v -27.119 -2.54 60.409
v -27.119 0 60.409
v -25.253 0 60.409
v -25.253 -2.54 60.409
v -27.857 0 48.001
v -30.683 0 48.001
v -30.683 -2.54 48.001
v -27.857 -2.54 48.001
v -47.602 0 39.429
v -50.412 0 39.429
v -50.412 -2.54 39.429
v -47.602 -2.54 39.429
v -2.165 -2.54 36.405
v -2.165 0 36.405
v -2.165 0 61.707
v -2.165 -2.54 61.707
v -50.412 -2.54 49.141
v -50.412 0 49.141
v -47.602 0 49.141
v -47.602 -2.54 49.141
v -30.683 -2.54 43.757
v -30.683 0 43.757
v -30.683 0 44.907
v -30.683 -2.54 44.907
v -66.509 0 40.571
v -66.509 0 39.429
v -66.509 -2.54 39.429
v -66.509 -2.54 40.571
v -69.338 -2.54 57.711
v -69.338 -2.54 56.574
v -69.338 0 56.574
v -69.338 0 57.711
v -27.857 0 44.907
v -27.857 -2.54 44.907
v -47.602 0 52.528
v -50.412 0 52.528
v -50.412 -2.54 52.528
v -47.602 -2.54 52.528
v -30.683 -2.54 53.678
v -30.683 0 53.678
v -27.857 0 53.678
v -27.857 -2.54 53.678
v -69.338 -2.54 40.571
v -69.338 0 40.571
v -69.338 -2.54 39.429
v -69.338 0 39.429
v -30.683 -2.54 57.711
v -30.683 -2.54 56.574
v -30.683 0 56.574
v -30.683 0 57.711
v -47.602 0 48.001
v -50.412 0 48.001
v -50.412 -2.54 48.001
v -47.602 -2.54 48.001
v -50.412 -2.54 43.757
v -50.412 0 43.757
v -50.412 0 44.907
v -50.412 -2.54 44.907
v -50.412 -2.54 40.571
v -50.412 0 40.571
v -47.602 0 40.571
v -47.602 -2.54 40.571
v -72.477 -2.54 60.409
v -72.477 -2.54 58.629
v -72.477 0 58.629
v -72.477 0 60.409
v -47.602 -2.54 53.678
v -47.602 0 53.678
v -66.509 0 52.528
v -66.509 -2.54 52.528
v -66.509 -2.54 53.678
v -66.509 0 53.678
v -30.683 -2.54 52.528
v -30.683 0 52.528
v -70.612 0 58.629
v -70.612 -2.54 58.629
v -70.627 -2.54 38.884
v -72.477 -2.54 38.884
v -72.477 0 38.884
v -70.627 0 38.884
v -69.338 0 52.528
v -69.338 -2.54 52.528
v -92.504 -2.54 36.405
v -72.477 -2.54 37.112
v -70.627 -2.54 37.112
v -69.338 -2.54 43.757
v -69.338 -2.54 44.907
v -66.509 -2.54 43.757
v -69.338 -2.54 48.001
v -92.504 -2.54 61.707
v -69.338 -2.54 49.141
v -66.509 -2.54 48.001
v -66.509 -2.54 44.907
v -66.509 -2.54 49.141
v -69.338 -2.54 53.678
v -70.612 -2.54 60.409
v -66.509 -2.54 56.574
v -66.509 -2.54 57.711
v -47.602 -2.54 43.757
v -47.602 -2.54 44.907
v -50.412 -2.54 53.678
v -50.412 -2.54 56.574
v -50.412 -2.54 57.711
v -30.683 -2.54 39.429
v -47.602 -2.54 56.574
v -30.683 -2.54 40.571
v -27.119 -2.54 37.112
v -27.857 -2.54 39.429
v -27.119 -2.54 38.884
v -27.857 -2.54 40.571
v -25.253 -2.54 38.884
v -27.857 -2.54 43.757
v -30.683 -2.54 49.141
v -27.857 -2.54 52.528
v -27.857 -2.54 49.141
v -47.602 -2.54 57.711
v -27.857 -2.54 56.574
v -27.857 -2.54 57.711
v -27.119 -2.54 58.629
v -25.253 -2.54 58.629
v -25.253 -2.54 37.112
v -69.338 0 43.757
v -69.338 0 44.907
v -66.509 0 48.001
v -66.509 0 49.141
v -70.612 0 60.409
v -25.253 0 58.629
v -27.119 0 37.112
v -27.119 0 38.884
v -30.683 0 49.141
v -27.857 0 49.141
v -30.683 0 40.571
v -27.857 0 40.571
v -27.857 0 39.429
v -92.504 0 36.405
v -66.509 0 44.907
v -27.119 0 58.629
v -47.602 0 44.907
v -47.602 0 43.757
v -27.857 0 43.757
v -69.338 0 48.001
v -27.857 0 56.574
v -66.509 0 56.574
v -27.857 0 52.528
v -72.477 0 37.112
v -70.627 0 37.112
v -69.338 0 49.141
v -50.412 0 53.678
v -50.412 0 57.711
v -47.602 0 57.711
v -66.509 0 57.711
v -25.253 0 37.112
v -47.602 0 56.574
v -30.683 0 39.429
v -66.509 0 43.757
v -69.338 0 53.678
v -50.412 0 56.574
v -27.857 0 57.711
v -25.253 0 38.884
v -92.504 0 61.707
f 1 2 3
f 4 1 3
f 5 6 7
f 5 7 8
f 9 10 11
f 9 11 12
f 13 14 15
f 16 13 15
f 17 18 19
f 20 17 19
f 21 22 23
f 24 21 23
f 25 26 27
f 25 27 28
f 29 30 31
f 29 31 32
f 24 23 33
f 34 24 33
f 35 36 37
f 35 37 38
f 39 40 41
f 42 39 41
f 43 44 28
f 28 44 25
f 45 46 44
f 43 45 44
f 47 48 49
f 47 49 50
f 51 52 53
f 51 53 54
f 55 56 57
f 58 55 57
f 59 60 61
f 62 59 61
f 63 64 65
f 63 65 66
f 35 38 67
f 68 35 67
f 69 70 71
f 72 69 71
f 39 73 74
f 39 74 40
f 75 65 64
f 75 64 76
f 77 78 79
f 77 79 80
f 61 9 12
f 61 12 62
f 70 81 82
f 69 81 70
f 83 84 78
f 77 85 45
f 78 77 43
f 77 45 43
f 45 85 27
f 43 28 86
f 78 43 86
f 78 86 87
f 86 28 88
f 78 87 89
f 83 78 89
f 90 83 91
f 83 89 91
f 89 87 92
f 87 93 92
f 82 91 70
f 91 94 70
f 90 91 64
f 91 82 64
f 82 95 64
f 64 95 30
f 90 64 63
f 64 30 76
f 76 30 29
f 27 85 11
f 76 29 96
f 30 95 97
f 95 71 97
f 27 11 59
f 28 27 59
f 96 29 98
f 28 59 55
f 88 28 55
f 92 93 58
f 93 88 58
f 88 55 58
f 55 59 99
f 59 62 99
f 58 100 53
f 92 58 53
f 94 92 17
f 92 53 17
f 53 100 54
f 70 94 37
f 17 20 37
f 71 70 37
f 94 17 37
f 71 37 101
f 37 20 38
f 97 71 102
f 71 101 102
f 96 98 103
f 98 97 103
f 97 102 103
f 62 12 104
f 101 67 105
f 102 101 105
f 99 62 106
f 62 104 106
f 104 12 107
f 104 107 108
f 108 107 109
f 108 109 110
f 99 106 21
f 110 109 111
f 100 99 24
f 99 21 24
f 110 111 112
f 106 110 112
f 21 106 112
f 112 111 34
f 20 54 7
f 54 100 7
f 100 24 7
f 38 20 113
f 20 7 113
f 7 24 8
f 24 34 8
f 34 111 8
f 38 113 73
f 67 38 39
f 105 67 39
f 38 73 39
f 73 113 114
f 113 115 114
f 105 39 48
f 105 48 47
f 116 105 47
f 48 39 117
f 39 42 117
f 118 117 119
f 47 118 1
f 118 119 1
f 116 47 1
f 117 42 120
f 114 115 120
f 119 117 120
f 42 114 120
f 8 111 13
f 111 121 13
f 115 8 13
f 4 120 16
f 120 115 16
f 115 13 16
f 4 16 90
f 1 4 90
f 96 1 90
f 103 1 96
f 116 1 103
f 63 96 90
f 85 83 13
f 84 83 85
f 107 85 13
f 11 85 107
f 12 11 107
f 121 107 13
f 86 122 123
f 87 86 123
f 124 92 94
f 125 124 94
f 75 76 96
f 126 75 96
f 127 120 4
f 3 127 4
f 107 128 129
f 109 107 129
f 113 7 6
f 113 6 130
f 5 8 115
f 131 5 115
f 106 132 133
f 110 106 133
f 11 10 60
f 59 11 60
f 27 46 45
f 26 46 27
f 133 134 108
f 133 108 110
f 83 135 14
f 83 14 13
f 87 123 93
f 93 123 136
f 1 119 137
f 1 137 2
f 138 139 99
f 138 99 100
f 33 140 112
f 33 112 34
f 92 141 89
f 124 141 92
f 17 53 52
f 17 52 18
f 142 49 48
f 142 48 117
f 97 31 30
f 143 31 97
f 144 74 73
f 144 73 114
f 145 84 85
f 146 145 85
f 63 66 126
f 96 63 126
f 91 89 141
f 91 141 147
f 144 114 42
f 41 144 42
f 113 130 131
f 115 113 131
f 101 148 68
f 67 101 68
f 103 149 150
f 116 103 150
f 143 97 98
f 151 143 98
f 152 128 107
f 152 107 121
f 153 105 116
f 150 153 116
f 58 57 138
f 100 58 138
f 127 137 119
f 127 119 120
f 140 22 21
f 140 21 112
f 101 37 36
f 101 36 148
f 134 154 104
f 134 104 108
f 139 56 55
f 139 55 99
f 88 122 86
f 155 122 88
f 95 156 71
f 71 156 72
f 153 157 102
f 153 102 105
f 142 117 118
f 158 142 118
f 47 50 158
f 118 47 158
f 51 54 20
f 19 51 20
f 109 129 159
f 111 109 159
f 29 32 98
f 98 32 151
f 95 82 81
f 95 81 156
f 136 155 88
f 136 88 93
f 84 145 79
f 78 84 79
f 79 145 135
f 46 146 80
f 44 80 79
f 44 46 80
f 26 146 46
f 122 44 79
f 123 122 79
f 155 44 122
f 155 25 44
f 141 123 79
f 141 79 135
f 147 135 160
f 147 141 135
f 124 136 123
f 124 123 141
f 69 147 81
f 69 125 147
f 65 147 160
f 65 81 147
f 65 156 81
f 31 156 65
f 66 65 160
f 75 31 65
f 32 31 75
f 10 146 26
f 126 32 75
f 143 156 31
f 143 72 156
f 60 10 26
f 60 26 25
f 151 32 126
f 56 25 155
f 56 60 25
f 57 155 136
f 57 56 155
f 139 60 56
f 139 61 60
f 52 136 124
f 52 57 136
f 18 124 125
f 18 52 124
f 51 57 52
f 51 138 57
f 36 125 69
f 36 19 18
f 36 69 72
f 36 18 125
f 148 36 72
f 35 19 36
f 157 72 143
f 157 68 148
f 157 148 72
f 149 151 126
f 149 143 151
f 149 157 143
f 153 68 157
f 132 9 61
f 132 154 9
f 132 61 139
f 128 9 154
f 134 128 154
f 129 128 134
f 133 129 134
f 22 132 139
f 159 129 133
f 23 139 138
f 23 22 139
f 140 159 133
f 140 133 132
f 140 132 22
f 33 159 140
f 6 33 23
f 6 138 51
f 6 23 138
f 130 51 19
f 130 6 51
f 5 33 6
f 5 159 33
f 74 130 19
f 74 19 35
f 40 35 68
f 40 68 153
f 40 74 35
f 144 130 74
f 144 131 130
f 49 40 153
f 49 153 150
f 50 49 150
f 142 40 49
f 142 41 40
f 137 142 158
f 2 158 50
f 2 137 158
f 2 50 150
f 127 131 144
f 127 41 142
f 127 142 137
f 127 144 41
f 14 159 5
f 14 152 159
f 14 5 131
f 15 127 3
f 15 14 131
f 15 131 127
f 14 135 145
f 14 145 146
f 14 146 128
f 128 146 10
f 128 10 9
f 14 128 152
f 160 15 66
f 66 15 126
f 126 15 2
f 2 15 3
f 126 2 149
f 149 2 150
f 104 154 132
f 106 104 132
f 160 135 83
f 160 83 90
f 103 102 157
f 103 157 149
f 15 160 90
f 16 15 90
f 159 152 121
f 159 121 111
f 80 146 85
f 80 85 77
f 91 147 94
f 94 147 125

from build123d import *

# Parameters (mm, degrees)
F0_W     = 59.3514069915
F0_H     = 25.3017321229
F0_W_2   = 2.8294473886
F0_H_2   = 1.1425092816
F0_W_3   = 2.8104633093
F0_H_3   = 1.1491477489
F0_H_4   = 1.1398382485
F0_W_4   = 2.8264205903
F0_H_5   = 1.1500753462
F0_H_6   = 1.1371672153
F2_DEPTH = 2.54
F1_W     = 1.8652155995
F1_H     = 1.7804317176
F1_W_2   = 1.8652137369
F1_W_3   = 1.850374043
F1_H_2   = 1.7718821764
F3_DEPTH = 25.4
F4_DEPTH = 13.716
F5_DEPTH = 17.272


with BuildPart() as f2:
    # F0 (on Front) → F2 (new body)
    with BuildSketch(Plane.XZ):
        with Locations((-45.5565787852, 49.0557551384)):
            Rectangle(F0_W, F0_H)
        with Locations((-67.9233074188, 39.9998538196)):
            Rectangle(F0_W_2, F0_H_2, mode=Mode.SUBTRACT)
        with Locations((-49.0072369576, 39.9998538196)):
            Rectangle(F0_W_3, F0_H_2, mode=Mode.SUBTRACT)
        with Locations((-67.9233074188, 44.3319603801)):
            Rectangle(F0_W_2, F0_H_3, mode=Mode.SUBTRACT)
        with Locations((-67.9233074188, 48.5712159425)):
            Rectangle(F0_W_2, F0_H_4, mode=Mode.SUBTRACT)
        with Locations((-49.0072369576, 44.3319603801)):
            Rectangle(F0_W_3, F0_H_3, mode=Mode.SUBTRACT)
        with Locations((-49.0072369576, 48.5712159425)):
            Rectangle(F0_W_3, F0_H_4, mode=Mode.SUBTRACT)
        with Locations((-29.2699420825, 39.9998538196)):
            Rectangle(F0_W_4, F0_H_2, mode=Mode.SUBTRACT)
        with Locations((-29.2699420825, 44.3319603801)):
            Rectangle(F0_W_4, F0_H_3, mode=Mode.SUBTRACT)
        with Locations((-29.2699420825, 48.5712159425)):
            Rectangle(F0_W_4, F0_H_4, mode=Mode.SUBTRACT)
        with Locations((-67.9233074188, 53.1031731516)):
            Rectangle(F0_W_2, F0_H_5, mode=Mode.SUBTRACT)
        with Locations((-49.0072369576, 53.1031731516)):
            Rectangle(F0_W_3, F0_H_5, mode=Mode.SUBTRACT)
        with Locations((-67.9233074188, 57.1425780654)):
            Rectangle(F0_W_2, F0_H_6, mode=Mode.SUBTRACT)
        with Locations((-49.0072369576, 57.1425780654)):
            Rectangle(F0_W_3, F0_H_6, mode=Mode.SUBTRACT)
        with Locations((-29.2699420825, 53.1031731516)):
            Rectangle(F0_W_4, F0_H_5, mode=Mode.SUBTRACT)
        with Locations((-29.2699420825, 57.1425780654)):
            Rectangle(F0_W_4, F0_H_6, mode=Mode.SUBTRACT)
    extrude(amount=F2_DEPTH)

    # F1 (on Front) → F3 (cut)
    with BuildSketch(Plane.XZ):
        with Locations((-71.5445019305, 59.5189426094)):
            Rectangle(F1_W, F1_H)
        with Locations((-26.1859139428, 59.5189426094)):
            Rectangle(F1_W_2, F1_H)
        with Locations((-71.5519227087, 37.9981175065)):
            Rectangle(F1_W_3, F1_H_2)
        with Locations((-26.1859139428, 37.9981175065)):
            Rectangle(F1_W_2, F1_H_2)
    extrude(amount=F3_DEPTH, mode=Mode.SUBTRACT)

    # F4 (add): a face of the model
    f4_faces = [f2.faces().sort_by_distance(p)[0] for p in [
        (-15.8808752894, -1.27, 49.0557551384),
    ]]
    extrude(f4_faces, amount=F4_DEPTH)

    # F5 (add): a face of the model
    f5_faces = [f2.faces().sort_by_distance(p)[0] for p in [
        (-75.2322822809, -1.27, 49.0557551384),
    ]]
    extrude(f5_faces, amount=F5_DEPTH)


solid = f2.part
